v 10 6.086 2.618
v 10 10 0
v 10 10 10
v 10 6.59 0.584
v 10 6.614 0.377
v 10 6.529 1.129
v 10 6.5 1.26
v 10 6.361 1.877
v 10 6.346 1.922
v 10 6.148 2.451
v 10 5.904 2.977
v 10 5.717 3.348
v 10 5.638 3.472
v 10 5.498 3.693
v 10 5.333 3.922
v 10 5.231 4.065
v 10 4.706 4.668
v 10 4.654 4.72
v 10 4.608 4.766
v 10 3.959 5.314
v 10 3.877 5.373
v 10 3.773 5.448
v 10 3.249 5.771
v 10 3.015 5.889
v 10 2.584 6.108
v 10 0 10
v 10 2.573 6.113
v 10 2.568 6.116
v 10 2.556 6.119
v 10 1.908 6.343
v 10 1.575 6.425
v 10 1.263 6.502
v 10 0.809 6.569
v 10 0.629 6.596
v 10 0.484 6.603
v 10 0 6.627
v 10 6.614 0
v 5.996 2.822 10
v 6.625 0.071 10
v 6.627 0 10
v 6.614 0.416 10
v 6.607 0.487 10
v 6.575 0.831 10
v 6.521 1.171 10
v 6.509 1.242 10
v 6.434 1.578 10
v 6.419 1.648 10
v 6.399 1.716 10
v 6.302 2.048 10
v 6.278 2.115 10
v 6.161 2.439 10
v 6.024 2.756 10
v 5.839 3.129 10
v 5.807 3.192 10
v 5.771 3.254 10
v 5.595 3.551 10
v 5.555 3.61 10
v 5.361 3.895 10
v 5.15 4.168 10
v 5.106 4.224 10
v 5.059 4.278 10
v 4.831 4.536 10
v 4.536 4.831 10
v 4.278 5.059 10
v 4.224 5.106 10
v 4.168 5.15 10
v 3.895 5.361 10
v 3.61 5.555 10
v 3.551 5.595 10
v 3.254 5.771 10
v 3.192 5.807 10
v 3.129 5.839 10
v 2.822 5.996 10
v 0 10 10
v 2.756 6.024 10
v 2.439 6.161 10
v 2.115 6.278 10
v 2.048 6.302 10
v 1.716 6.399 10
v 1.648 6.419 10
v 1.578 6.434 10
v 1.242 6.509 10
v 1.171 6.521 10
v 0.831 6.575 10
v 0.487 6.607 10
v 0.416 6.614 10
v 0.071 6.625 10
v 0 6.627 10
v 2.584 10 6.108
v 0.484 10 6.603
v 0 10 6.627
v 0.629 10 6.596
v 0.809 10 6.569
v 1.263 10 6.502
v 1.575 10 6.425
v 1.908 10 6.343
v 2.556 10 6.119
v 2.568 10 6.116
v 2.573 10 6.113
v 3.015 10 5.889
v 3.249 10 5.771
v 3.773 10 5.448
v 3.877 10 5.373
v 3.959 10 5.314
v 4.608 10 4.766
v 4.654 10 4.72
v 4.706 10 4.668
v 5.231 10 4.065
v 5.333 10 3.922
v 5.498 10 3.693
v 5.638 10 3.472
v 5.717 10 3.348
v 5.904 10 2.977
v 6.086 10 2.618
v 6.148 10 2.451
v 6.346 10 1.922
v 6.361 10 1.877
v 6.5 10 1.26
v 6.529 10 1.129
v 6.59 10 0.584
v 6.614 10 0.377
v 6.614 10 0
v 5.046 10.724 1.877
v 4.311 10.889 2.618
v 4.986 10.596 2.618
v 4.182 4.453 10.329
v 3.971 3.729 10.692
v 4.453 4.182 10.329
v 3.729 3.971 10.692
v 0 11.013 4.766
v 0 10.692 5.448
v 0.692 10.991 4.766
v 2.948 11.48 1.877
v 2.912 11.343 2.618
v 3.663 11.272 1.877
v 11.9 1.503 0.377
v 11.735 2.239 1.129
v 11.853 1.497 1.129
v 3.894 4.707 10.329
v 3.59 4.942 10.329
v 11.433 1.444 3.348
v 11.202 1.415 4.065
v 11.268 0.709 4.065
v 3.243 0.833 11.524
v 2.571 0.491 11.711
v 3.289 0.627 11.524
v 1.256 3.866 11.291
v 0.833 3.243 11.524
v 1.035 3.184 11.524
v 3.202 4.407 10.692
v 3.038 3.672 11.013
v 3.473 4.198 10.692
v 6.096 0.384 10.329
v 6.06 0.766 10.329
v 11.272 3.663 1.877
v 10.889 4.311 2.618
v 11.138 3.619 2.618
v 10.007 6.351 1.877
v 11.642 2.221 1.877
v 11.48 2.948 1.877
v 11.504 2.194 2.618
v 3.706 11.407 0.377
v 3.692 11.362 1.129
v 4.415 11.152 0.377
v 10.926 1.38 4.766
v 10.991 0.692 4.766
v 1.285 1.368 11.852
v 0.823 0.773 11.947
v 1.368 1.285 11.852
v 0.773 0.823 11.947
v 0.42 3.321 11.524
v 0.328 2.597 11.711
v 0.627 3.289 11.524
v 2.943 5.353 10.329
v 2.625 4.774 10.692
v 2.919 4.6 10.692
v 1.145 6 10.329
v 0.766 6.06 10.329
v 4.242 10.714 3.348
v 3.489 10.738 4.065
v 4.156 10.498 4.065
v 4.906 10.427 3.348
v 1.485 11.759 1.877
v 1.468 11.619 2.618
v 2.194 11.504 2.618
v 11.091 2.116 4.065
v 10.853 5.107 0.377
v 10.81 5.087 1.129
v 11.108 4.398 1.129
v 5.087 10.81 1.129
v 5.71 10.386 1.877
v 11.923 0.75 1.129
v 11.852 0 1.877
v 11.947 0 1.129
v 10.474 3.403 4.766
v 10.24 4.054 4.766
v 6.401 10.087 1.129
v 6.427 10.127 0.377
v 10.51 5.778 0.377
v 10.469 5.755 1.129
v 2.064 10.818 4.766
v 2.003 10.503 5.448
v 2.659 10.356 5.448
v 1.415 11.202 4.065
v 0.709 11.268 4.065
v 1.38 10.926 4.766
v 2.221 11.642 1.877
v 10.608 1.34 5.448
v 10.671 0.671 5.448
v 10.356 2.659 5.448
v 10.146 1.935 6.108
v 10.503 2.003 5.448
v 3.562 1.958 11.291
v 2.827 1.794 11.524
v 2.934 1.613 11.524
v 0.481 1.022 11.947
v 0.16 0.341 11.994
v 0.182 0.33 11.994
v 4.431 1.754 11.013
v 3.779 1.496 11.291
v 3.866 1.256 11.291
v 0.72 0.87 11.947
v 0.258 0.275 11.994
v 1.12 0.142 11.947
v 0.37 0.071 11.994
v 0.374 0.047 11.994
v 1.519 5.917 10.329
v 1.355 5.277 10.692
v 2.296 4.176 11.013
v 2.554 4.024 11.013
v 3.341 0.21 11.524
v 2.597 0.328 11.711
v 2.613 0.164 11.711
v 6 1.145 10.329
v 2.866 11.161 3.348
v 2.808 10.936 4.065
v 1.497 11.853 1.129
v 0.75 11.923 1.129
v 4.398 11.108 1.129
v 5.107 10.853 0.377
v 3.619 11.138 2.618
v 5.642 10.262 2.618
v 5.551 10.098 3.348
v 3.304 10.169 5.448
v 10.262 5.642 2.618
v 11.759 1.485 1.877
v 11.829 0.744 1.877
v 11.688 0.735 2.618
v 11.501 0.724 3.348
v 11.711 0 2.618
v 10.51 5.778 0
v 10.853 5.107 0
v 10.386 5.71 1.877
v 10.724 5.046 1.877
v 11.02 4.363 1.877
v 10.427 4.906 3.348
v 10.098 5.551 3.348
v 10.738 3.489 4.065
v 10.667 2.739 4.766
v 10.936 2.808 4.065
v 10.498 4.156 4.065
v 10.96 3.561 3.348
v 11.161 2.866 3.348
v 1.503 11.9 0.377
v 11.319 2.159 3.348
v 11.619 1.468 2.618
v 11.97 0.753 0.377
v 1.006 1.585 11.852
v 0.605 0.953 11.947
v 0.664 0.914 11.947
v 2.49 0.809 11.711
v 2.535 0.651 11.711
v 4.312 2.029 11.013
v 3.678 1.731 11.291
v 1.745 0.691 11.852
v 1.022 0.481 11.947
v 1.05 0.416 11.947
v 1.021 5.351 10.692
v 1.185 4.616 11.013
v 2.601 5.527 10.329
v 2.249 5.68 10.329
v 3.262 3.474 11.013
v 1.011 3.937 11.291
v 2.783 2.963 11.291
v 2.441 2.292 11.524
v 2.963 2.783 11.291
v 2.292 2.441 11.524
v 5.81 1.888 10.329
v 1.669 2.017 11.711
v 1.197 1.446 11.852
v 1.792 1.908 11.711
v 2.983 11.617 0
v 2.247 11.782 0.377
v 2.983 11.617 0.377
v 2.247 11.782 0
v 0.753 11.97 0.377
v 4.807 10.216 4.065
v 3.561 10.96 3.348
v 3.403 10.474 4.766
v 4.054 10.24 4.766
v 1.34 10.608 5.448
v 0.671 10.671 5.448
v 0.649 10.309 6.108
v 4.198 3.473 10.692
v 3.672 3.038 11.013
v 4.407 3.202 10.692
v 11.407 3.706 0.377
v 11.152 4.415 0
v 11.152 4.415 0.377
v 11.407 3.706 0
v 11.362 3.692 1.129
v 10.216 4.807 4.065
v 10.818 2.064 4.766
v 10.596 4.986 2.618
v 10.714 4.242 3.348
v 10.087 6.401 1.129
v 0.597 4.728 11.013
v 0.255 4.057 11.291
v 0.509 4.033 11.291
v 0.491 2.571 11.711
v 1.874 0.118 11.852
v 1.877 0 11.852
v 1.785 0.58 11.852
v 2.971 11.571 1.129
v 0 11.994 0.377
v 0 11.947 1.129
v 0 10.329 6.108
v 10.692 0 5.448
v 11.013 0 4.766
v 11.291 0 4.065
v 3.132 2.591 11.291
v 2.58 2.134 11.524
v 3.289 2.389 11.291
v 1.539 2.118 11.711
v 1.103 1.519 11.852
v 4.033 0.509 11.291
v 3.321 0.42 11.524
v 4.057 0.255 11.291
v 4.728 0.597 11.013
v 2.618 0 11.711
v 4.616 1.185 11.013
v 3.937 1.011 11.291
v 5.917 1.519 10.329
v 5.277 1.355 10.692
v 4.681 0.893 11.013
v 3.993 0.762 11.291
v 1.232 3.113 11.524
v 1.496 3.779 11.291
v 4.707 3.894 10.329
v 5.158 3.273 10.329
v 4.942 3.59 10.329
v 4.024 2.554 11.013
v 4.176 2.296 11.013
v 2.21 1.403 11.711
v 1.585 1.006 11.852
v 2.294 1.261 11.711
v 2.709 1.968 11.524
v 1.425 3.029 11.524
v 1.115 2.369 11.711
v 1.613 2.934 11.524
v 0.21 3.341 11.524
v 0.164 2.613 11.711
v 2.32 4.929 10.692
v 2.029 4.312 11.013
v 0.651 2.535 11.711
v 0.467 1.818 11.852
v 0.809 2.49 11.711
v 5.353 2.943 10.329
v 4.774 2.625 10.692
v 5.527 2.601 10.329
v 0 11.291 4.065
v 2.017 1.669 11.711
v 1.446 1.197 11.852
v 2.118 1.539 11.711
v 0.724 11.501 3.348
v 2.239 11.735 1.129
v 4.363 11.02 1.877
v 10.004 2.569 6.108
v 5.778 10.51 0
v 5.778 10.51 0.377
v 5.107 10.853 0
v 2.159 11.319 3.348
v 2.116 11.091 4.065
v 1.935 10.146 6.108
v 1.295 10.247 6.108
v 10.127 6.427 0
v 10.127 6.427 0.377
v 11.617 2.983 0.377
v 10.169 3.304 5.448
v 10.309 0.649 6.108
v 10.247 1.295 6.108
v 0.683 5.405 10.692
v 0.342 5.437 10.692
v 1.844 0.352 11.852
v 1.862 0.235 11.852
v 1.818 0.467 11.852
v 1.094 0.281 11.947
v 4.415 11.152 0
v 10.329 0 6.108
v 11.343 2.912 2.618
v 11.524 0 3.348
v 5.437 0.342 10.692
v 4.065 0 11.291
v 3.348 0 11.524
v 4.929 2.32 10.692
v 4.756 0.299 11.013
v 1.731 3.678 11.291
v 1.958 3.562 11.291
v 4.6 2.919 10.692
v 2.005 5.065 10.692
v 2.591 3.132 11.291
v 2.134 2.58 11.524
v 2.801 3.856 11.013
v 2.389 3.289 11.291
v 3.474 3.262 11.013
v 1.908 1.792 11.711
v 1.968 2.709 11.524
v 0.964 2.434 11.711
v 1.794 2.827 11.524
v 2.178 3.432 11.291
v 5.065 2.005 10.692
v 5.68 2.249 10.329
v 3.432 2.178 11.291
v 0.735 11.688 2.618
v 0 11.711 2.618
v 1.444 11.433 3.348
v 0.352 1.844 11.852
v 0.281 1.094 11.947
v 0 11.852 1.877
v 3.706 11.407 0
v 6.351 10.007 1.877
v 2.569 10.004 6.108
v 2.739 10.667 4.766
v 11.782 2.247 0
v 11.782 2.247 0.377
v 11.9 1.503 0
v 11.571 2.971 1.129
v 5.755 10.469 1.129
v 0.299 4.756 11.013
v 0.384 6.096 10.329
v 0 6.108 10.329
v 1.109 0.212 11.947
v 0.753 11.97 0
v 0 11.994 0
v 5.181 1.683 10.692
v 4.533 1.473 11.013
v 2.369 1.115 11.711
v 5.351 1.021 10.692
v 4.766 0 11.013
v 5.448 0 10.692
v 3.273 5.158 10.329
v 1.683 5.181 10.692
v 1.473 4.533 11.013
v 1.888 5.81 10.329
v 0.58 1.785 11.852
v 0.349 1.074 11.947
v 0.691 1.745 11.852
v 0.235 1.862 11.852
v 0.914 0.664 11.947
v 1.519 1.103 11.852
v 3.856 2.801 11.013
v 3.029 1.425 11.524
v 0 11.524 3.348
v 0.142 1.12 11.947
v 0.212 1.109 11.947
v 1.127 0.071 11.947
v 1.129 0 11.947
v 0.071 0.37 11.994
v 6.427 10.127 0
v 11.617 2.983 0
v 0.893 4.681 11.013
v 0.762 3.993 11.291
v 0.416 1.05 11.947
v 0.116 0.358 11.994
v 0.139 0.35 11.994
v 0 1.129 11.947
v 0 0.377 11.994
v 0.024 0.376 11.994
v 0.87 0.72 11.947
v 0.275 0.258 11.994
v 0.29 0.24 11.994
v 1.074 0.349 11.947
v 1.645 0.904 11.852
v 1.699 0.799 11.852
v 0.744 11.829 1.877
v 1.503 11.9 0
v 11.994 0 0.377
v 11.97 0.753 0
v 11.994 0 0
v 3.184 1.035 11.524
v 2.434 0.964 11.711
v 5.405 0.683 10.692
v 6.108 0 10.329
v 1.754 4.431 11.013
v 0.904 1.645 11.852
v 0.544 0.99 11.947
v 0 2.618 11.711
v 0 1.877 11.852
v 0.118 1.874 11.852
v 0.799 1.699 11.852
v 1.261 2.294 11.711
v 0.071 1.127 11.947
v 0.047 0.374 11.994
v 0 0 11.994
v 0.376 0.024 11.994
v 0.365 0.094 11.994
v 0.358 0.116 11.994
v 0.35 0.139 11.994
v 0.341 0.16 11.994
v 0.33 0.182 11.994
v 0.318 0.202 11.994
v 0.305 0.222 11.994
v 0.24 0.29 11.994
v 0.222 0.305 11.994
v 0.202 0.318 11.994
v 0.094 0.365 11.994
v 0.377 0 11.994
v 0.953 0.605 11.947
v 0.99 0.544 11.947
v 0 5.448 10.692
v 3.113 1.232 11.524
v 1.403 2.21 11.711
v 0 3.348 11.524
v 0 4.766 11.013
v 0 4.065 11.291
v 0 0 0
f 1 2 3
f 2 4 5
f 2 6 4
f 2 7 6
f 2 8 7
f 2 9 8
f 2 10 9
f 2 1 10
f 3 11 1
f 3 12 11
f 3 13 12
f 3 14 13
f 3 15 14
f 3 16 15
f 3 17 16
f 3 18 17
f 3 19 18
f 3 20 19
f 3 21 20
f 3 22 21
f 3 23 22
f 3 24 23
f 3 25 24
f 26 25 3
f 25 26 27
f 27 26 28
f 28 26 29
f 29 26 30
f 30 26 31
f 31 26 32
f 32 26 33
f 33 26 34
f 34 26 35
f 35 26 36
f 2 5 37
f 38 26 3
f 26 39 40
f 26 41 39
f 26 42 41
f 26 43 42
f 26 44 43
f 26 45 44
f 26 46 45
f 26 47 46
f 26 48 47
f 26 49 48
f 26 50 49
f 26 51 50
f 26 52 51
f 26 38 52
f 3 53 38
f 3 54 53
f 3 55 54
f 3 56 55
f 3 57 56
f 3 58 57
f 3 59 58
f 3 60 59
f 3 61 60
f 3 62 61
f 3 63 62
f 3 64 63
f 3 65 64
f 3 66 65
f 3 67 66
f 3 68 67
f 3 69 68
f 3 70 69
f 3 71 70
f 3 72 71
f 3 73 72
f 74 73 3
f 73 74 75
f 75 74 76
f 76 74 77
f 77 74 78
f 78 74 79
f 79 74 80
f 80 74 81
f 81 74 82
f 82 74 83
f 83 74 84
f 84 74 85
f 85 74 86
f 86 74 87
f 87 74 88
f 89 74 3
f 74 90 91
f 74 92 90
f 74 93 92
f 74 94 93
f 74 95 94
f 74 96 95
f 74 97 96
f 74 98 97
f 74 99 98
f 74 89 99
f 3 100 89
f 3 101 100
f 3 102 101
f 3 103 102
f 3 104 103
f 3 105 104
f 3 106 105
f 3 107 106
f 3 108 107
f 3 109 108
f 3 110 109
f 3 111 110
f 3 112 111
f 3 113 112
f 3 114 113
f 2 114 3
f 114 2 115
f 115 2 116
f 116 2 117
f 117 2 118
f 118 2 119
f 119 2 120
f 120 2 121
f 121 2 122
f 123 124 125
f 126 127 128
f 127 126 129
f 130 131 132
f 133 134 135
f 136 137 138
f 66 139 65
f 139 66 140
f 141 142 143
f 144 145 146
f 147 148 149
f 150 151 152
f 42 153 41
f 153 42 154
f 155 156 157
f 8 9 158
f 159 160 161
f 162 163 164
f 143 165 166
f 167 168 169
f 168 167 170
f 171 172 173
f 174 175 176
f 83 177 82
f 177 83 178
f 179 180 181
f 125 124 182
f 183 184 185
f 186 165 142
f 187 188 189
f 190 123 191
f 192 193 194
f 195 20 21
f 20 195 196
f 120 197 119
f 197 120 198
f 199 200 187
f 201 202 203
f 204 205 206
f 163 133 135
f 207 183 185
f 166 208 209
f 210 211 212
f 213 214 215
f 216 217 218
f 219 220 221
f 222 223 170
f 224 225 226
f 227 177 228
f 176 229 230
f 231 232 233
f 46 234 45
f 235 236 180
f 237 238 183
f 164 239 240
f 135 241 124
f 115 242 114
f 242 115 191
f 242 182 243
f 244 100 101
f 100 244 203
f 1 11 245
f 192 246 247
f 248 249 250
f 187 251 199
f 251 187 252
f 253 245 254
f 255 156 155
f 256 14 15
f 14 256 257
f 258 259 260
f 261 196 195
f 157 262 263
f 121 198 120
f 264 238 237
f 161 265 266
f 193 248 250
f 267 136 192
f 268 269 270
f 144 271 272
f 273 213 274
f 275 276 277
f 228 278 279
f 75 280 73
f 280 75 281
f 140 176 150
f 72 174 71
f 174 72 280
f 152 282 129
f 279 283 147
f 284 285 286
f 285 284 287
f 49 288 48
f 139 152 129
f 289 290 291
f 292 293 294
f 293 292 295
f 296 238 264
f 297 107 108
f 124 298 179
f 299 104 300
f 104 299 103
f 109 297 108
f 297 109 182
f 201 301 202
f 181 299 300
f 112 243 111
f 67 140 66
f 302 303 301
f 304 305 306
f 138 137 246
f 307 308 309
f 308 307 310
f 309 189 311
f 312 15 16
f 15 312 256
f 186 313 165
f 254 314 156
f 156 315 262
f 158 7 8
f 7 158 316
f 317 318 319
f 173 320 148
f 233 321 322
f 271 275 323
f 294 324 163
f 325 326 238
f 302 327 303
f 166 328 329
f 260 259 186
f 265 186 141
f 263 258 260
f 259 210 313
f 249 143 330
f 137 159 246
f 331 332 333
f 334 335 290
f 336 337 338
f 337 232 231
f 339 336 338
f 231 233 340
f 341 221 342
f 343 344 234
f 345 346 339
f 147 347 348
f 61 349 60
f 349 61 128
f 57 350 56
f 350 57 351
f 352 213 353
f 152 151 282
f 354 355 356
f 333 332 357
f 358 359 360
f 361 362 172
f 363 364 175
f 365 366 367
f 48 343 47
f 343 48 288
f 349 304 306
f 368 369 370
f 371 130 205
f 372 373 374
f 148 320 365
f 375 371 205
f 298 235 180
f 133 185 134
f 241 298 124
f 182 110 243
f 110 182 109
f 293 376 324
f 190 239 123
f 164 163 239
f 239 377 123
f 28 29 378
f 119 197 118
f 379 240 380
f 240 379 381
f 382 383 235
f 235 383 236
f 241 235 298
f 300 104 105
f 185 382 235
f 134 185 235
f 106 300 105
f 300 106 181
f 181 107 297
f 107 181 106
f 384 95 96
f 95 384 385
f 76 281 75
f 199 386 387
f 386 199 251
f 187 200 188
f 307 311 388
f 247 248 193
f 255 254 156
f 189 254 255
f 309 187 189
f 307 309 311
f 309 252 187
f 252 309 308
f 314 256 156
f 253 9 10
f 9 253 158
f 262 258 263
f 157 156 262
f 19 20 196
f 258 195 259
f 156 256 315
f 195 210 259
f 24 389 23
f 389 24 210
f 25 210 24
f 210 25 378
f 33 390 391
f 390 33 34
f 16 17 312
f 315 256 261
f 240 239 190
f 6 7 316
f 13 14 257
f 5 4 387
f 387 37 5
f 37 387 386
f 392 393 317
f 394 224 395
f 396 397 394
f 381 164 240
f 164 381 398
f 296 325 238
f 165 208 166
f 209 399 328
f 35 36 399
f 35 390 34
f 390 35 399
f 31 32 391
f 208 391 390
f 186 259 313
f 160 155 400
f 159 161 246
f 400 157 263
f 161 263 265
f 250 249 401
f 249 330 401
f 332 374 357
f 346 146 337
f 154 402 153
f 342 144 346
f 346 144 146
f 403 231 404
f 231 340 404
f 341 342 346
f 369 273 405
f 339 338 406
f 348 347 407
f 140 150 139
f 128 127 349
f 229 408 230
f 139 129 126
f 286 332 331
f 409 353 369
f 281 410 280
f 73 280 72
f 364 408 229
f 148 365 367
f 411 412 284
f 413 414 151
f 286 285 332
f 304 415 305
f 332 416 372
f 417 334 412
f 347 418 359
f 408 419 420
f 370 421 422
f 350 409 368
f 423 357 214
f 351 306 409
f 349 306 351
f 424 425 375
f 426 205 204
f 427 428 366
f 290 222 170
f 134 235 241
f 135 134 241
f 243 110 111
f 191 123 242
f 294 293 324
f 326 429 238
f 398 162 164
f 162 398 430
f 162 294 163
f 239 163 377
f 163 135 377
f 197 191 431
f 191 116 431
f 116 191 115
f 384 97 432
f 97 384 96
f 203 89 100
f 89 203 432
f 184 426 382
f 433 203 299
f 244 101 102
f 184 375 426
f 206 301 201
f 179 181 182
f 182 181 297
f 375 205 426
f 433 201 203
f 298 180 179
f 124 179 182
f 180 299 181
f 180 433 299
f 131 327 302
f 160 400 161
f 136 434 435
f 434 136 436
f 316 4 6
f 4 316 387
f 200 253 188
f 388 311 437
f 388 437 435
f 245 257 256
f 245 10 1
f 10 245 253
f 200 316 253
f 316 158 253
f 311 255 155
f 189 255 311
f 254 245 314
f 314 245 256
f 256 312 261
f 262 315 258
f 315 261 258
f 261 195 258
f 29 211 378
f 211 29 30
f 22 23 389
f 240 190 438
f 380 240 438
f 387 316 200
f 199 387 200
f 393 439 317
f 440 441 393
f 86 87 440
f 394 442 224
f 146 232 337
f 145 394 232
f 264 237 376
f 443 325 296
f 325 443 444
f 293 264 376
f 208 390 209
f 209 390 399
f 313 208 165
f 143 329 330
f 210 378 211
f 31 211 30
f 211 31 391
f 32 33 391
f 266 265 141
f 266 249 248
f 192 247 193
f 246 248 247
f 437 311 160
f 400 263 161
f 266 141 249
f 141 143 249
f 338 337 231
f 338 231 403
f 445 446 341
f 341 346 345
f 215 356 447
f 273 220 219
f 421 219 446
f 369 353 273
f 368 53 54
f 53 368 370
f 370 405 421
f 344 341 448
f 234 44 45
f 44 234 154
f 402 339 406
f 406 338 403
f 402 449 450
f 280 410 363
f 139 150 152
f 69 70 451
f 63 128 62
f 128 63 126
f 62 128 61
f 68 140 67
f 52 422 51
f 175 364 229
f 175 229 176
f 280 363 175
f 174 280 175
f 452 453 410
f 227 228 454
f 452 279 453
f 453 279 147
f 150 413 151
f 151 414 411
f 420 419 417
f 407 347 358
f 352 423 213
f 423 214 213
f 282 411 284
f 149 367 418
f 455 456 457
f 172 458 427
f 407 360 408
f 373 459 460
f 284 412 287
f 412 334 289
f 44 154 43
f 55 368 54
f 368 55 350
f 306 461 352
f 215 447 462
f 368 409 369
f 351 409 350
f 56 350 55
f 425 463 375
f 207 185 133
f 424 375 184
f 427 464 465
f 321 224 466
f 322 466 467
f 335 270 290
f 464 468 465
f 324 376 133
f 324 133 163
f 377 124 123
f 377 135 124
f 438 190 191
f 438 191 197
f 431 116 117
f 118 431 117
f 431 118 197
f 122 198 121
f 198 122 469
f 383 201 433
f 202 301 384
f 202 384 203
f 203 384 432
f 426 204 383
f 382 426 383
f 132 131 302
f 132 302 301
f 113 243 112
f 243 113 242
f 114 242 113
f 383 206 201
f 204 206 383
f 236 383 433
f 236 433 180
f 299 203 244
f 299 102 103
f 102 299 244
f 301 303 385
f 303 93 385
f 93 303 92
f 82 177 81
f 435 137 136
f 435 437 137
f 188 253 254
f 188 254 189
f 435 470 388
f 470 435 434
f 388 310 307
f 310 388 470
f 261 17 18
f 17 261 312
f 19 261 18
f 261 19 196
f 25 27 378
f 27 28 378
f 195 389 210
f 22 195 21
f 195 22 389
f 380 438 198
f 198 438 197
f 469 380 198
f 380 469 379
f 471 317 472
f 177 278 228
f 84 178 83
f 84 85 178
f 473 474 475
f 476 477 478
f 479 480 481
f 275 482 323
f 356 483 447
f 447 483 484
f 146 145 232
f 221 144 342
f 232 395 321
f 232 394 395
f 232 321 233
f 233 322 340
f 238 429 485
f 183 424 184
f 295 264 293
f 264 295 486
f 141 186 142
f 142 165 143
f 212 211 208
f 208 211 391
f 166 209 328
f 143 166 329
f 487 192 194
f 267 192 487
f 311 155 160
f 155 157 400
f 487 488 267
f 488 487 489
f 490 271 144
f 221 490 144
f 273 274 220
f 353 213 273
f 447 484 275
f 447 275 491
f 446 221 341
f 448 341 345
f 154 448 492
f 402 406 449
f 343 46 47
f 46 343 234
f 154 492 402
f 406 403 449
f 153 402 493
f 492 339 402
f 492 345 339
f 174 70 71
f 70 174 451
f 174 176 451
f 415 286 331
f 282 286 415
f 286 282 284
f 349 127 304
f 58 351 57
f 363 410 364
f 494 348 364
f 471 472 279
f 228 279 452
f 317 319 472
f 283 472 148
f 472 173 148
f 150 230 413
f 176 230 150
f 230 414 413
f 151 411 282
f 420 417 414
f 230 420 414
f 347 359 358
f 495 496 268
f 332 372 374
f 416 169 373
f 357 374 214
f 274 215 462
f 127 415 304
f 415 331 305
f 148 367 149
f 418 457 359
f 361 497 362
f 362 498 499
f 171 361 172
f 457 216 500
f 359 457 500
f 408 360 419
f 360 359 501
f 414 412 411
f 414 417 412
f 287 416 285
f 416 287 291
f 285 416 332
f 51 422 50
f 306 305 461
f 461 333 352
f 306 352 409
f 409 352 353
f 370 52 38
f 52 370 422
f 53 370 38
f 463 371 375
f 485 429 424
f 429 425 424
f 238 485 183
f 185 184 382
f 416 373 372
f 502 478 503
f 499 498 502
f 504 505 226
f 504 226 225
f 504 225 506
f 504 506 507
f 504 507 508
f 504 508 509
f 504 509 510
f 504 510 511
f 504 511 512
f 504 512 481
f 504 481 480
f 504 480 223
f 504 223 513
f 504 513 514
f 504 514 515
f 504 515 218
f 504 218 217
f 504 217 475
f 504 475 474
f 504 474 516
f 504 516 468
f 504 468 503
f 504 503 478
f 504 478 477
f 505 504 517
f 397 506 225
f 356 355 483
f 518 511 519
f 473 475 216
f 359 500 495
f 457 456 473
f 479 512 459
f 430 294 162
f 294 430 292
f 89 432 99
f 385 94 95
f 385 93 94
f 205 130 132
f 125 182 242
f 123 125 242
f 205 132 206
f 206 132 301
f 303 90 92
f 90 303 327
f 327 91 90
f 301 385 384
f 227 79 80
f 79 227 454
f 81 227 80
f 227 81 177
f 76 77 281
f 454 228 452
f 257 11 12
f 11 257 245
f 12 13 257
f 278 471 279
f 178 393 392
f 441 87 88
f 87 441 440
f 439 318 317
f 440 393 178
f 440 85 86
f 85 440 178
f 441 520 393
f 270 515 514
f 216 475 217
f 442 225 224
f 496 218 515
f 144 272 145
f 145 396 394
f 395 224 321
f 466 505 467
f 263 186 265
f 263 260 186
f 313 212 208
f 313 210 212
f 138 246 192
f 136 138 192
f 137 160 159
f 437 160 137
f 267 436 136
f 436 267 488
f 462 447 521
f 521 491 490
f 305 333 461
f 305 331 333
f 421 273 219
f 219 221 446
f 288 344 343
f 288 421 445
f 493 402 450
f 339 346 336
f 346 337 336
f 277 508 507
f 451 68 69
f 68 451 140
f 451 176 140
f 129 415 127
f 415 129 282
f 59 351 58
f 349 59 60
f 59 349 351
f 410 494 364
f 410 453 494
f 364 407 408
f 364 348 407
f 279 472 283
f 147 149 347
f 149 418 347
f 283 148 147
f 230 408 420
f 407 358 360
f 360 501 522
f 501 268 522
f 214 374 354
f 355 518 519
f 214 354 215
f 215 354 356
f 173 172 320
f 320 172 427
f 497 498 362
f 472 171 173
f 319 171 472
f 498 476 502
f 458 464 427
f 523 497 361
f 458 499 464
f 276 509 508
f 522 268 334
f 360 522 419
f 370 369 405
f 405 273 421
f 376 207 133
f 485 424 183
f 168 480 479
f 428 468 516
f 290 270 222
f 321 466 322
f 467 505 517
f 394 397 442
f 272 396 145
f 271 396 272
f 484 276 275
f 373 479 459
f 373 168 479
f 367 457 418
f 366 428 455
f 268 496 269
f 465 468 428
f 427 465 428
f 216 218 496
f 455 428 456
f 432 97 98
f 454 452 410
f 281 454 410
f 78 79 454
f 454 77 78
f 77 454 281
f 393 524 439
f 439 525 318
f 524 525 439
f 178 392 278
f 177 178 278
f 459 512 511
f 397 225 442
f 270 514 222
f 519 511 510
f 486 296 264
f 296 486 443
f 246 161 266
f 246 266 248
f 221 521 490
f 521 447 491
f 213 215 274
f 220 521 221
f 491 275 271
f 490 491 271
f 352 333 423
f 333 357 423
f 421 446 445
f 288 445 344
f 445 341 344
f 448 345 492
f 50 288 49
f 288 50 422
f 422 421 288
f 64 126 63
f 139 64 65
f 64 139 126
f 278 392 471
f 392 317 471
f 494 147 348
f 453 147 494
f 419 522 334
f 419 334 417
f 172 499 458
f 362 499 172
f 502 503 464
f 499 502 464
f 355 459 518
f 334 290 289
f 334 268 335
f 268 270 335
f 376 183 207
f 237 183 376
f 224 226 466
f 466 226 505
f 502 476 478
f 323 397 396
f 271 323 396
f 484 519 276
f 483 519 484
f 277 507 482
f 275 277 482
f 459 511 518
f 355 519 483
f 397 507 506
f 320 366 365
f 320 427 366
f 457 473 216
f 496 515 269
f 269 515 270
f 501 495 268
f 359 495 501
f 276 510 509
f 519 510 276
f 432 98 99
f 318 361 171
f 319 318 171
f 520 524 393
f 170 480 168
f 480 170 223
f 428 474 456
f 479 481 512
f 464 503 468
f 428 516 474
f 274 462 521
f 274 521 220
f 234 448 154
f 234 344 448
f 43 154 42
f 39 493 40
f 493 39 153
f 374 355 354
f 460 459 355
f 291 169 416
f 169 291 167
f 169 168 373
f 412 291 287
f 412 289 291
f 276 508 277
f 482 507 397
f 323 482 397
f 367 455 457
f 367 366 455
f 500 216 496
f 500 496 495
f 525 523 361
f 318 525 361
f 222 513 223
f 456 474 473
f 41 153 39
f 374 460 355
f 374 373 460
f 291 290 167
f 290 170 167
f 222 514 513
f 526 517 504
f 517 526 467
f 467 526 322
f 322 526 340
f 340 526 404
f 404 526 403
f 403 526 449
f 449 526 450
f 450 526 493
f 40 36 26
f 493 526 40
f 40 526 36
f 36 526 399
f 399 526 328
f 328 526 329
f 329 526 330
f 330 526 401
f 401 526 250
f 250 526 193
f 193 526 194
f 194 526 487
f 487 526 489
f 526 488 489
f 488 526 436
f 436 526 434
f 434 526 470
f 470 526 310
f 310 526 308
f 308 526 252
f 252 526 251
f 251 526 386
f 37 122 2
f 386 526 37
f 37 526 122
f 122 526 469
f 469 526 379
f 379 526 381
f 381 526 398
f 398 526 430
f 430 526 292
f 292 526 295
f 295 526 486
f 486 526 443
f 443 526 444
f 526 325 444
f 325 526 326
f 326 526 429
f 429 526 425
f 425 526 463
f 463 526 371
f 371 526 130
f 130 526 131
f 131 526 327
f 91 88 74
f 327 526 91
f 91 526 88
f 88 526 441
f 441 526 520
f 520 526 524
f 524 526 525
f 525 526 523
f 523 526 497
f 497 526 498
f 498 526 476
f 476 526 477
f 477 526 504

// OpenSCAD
intersection() {
    translate([0,0,0]) {
        cube(20,true);
        sphere(12,$fn=100);
    }
    scale(20) {
        polyhedron(
            points=[
                [1,1,1],
                [0,1,1],
                [1,0,1],
                [0,0,1],
                [1,1,0],
                [0,1,0],
                [1,0,0],
                [0,0,0],
                // [0,0,0], // BAD
            ],
            faces=[
                [ 0, 4, 6, 2 ],
                [ 2, 6, 7, 3 ],
                [ 3, 7, 5, 1 ],
                [ 1, 5, 4, 0 ],
                [ 0, 2, 3, 1 ],
                [ 4, 5, 7, 6 ],
            ]);
    };
}
